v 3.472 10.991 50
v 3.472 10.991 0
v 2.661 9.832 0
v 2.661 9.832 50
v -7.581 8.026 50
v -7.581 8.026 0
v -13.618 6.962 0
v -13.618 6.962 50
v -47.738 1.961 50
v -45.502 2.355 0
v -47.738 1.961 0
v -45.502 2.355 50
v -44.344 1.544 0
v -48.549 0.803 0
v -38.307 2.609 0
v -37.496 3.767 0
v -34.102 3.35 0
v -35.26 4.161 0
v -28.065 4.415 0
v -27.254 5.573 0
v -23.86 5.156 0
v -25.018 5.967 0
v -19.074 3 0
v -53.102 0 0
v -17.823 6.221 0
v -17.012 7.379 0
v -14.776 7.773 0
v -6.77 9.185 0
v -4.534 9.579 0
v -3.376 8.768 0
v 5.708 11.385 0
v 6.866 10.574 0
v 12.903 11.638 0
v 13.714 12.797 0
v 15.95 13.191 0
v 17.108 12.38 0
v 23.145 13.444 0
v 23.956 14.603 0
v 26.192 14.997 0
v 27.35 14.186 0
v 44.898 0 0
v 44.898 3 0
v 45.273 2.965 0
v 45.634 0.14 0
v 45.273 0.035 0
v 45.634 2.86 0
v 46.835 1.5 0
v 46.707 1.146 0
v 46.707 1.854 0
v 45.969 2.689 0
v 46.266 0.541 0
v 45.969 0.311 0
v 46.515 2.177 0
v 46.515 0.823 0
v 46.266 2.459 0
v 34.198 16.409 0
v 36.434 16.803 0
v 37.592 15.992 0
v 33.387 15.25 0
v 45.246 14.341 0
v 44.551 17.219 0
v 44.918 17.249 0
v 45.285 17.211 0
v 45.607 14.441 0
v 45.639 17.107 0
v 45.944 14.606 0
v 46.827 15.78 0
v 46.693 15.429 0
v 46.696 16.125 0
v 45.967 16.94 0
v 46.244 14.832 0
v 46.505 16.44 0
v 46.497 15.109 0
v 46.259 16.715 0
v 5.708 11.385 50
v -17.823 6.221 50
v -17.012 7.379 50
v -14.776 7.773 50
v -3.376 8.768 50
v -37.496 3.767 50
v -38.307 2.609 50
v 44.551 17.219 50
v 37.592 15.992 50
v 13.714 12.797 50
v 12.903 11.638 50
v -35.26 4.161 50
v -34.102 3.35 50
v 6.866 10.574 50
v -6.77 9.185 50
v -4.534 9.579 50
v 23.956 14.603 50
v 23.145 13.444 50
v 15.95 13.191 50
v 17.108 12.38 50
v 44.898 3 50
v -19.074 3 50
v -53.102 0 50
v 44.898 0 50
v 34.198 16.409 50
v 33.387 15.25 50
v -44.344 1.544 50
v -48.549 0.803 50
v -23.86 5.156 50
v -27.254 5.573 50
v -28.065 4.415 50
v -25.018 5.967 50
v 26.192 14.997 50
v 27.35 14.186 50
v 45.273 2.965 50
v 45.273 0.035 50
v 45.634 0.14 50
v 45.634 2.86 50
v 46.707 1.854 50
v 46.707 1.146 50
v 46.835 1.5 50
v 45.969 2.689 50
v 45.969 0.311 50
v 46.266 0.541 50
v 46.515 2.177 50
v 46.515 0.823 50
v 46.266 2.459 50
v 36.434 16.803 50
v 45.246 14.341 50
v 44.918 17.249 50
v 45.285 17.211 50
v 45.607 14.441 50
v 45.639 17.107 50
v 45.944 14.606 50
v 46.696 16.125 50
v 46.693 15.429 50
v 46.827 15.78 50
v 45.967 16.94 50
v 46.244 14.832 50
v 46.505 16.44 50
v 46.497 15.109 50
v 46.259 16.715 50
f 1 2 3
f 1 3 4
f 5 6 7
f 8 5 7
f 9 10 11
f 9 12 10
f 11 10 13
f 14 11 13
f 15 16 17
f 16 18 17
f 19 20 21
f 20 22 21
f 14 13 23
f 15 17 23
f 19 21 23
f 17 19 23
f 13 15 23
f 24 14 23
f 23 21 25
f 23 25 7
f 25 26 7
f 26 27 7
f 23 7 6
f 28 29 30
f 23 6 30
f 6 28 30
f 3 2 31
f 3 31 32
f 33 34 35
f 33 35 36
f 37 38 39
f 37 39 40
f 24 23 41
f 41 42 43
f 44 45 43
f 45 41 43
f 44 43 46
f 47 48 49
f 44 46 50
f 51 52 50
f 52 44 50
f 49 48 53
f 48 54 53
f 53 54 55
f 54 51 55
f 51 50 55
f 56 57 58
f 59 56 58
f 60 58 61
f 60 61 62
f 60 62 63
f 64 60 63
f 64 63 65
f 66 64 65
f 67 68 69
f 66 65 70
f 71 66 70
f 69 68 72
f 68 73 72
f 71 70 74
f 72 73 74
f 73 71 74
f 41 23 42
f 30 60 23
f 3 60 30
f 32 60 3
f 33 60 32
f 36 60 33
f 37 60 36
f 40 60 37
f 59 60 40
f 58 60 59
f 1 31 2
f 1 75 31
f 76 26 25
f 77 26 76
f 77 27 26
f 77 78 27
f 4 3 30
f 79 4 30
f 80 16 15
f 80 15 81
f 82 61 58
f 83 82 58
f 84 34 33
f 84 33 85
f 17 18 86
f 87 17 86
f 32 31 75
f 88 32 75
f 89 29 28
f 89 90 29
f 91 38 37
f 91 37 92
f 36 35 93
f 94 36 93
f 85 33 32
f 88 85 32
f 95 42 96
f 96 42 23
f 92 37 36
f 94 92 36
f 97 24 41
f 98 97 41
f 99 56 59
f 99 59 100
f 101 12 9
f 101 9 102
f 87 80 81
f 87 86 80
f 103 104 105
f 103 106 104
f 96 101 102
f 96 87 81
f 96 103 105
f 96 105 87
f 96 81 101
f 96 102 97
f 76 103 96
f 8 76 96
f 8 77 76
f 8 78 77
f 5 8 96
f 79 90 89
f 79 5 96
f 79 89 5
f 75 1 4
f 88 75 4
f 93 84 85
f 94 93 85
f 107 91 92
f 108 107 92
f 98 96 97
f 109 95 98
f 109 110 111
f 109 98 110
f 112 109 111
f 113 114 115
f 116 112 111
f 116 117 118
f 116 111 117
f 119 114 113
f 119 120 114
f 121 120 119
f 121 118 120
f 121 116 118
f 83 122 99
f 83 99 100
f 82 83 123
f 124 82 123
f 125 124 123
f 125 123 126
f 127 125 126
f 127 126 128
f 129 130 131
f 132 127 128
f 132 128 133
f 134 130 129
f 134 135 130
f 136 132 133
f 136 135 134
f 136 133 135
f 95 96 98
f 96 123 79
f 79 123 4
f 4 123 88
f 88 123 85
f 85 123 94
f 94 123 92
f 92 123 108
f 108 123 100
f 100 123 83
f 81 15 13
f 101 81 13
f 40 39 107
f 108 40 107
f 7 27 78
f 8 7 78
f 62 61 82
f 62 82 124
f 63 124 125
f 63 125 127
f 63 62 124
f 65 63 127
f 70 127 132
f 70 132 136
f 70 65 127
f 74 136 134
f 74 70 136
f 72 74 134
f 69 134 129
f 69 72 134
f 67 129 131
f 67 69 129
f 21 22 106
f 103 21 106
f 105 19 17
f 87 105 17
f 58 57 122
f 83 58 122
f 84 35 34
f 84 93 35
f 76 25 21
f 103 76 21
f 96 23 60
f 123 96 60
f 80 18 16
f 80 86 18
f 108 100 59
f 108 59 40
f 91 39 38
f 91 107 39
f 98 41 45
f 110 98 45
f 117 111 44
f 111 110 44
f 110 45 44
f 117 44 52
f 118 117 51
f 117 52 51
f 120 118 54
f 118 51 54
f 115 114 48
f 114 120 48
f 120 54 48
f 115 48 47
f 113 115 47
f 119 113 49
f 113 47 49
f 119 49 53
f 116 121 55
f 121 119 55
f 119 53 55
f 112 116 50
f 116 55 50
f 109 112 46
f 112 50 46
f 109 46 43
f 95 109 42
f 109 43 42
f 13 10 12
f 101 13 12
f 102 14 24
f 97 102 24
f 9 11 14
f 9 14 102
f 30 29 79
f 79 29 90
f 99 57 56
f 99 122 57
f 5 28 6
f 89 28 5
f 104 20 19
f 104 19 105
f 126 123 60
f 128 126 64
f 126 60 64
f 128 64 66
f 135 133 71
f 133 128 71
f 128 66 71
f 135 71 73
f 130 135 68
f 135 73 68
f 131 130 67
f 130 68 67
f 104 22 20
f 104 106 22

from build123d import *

# Parameters (mm, degrees)
F1_DEPTH    = 50
F2_T1_DEPTH = 61.9175359259
F2_T3_DEPTH = 58.3909963118
F2_T5_DEPTH = 60
F3_W        = 4.27056849
F3_H        = 50
F4_DEPTH    = 1
F5_SIZE     = 0.99999


# Not quite as in the source:
# - a fillet or chamfer that OpenCascade refuses, or shapes differently, is made with other operations: its cross-section is extruded or revolved along the edge and cut away or added
# - a fillet or chamfer is up to 0.001 mm smaller than in the source, because OpenCascade refuses the exact size


with BuildPart() as f1:
    # F0 (on Top) → F1 (new body)
    with BuildSketch(Plane.XY):
        Polygon((-53.1016754424, 0), (46.8983245576, 0), (46.8983245576, 3), (-19.0739845247, 3), (46.8983245576, 14.6326980708), (46.8983245576, 17.6326980708), align=None)
    extrude(amount=F1_DEPTH)

    # F2: fillet of radius 2 on 4 edges, made by hand

    # F2_s2 → F2_t1 (cut)
    with BuildSketch(Plane.XY.offset(-5.958767963)):
        with BuildLine():
            ThreePointArc((44.5510282023, 17.2188063917), (46.183899777, 16.7812797719), (46.8983245576, 15.2491908857))
            Line((46.8983245576, 15.2491908857), (46.8983245576, 17.6326980708))
            Line((46.8983245576, 17.6326980708), (44.5510282023, 17.2188063917))
        make_face()
    extrude(amount=F2_T1_DEPTH, mode=Mode.SUBTRACT)

    # F2_s4 → F2_t3 (cut)
    with BuildSketch(Plane.XY.offset(-4.1954981559)):
        with BuildLine():
            ThreePointArc((45.245620913, 14.3412818272), (46.4304134439, 15.0253221138), (46.8983245576, 16.3108973332))
            Line((46.8983245576, 16.3108973332), (46.8983245576, 14.6326980708))
            Line((46.8983245576, 14.6326980708), (45.245620913, 14.3412818272))
        make_face()
    extrude(amount=F2_T3_DEPTH, mode=Mode.SUBTRACT)

    # F2_s6 → F2_t5 (cut)
    with BuildSketch(Plane.XY.offset(-5)):
        with BuildLine():
            ThreePointArc((46.8983245576, 1), (46.31253812, 2.4142135624), (44.8983245576, 3))
            Line((44.8983245576, 3), (46.8983245576, 3))
            Line((46.8983245576, 3), (46.8983245576, 1))
        make_face()
        with BuildLine():
            ThreePointArc((44.8983245576, 0), (46.31253812, 0.5857864376), (46.8983245576, 2))
            Line((46.8983245576, 2), (46.8983245576, 0))
            Line((46.8983245576, 0), (44.8983245576, 0))
        make_face()
    extrude(amount=F2_T5_DEPTH, mode=Mode.SUBTRACT)

    # F3 (on face) → F4 (join)
    with BuildSketch(Plane(origin=(-1.6012114389, 9.0809213228, 0), x_dir=(-0.984807753, -0.1736481777, 0), z_dir=(-0.1736481777, 0.984807753, 0))):
        with Locations((45.5371029675, 25)):
            Rectangle(F3_W, F3_H)
        with Locations((35.1371029675, 25)):
            Rectangle(F3_W, F3_H)
        with Locations((24.7371029675, 25)):
            Rectangle(F3_W, F3_H)
        with Locations((14.3371029675, 25)):
            Rectangle(F3_W, F3_H)
        with Locations((3.9371029675, 25)):
            Rectangle(F3_W, F3_H)
        with Locations((-6.4628970325, 25)):
            Rectangle(F3_W, F3_H)
        with Locations((-16.8628970325, 25)):
            Rectangle(F3_W, F3_H)
        with Locations((-27.2628970325, 25)):
            Rectangle(F3_W, F3_H)
        with Locations((-37.6628970325, 25)):
            Rectangle(F3_W, F3_H)
    extrude(amount=F4_DEPTH)

    # F5 (size 1 in the source; OpenCascade refuses exactly that, so slightly less here)
    f5_edges = [f1.edges().sort_by_distance(p)[0] for p in [
        (-48.722996, 1.787506, 25),
        (-44.517307, 2.529082, 25),
        (-38.480996, 3.593447, 25),
        (-34.275307, 4.335023, 25),
        (-28.238995, 5.399388, 25),
        (-24.033306, 6.140964, 25),
        (-17.996994, 7.205329, 25),
        (-13.791305, 7.946905, 25),
        (-7.754994, 9.01127, 25),
        (-3.549305, 9.752847, 25),
        (2.487007, 10.817211, 25),
        (6.692696, 11.558788, 25),
        (12.729008, 12.623152, 25),
        (16.934697, 13.364729, 25),
        (22.971008, 14.429093, 25),
        (27.176697, 15.17067, 25),
        (33.213009, 16.235034, 25),
        (37.418698, 16.976611, 25),
    ]]
    chamfer(f5_edges, length=F5_SIZE)


solid = f1.part
